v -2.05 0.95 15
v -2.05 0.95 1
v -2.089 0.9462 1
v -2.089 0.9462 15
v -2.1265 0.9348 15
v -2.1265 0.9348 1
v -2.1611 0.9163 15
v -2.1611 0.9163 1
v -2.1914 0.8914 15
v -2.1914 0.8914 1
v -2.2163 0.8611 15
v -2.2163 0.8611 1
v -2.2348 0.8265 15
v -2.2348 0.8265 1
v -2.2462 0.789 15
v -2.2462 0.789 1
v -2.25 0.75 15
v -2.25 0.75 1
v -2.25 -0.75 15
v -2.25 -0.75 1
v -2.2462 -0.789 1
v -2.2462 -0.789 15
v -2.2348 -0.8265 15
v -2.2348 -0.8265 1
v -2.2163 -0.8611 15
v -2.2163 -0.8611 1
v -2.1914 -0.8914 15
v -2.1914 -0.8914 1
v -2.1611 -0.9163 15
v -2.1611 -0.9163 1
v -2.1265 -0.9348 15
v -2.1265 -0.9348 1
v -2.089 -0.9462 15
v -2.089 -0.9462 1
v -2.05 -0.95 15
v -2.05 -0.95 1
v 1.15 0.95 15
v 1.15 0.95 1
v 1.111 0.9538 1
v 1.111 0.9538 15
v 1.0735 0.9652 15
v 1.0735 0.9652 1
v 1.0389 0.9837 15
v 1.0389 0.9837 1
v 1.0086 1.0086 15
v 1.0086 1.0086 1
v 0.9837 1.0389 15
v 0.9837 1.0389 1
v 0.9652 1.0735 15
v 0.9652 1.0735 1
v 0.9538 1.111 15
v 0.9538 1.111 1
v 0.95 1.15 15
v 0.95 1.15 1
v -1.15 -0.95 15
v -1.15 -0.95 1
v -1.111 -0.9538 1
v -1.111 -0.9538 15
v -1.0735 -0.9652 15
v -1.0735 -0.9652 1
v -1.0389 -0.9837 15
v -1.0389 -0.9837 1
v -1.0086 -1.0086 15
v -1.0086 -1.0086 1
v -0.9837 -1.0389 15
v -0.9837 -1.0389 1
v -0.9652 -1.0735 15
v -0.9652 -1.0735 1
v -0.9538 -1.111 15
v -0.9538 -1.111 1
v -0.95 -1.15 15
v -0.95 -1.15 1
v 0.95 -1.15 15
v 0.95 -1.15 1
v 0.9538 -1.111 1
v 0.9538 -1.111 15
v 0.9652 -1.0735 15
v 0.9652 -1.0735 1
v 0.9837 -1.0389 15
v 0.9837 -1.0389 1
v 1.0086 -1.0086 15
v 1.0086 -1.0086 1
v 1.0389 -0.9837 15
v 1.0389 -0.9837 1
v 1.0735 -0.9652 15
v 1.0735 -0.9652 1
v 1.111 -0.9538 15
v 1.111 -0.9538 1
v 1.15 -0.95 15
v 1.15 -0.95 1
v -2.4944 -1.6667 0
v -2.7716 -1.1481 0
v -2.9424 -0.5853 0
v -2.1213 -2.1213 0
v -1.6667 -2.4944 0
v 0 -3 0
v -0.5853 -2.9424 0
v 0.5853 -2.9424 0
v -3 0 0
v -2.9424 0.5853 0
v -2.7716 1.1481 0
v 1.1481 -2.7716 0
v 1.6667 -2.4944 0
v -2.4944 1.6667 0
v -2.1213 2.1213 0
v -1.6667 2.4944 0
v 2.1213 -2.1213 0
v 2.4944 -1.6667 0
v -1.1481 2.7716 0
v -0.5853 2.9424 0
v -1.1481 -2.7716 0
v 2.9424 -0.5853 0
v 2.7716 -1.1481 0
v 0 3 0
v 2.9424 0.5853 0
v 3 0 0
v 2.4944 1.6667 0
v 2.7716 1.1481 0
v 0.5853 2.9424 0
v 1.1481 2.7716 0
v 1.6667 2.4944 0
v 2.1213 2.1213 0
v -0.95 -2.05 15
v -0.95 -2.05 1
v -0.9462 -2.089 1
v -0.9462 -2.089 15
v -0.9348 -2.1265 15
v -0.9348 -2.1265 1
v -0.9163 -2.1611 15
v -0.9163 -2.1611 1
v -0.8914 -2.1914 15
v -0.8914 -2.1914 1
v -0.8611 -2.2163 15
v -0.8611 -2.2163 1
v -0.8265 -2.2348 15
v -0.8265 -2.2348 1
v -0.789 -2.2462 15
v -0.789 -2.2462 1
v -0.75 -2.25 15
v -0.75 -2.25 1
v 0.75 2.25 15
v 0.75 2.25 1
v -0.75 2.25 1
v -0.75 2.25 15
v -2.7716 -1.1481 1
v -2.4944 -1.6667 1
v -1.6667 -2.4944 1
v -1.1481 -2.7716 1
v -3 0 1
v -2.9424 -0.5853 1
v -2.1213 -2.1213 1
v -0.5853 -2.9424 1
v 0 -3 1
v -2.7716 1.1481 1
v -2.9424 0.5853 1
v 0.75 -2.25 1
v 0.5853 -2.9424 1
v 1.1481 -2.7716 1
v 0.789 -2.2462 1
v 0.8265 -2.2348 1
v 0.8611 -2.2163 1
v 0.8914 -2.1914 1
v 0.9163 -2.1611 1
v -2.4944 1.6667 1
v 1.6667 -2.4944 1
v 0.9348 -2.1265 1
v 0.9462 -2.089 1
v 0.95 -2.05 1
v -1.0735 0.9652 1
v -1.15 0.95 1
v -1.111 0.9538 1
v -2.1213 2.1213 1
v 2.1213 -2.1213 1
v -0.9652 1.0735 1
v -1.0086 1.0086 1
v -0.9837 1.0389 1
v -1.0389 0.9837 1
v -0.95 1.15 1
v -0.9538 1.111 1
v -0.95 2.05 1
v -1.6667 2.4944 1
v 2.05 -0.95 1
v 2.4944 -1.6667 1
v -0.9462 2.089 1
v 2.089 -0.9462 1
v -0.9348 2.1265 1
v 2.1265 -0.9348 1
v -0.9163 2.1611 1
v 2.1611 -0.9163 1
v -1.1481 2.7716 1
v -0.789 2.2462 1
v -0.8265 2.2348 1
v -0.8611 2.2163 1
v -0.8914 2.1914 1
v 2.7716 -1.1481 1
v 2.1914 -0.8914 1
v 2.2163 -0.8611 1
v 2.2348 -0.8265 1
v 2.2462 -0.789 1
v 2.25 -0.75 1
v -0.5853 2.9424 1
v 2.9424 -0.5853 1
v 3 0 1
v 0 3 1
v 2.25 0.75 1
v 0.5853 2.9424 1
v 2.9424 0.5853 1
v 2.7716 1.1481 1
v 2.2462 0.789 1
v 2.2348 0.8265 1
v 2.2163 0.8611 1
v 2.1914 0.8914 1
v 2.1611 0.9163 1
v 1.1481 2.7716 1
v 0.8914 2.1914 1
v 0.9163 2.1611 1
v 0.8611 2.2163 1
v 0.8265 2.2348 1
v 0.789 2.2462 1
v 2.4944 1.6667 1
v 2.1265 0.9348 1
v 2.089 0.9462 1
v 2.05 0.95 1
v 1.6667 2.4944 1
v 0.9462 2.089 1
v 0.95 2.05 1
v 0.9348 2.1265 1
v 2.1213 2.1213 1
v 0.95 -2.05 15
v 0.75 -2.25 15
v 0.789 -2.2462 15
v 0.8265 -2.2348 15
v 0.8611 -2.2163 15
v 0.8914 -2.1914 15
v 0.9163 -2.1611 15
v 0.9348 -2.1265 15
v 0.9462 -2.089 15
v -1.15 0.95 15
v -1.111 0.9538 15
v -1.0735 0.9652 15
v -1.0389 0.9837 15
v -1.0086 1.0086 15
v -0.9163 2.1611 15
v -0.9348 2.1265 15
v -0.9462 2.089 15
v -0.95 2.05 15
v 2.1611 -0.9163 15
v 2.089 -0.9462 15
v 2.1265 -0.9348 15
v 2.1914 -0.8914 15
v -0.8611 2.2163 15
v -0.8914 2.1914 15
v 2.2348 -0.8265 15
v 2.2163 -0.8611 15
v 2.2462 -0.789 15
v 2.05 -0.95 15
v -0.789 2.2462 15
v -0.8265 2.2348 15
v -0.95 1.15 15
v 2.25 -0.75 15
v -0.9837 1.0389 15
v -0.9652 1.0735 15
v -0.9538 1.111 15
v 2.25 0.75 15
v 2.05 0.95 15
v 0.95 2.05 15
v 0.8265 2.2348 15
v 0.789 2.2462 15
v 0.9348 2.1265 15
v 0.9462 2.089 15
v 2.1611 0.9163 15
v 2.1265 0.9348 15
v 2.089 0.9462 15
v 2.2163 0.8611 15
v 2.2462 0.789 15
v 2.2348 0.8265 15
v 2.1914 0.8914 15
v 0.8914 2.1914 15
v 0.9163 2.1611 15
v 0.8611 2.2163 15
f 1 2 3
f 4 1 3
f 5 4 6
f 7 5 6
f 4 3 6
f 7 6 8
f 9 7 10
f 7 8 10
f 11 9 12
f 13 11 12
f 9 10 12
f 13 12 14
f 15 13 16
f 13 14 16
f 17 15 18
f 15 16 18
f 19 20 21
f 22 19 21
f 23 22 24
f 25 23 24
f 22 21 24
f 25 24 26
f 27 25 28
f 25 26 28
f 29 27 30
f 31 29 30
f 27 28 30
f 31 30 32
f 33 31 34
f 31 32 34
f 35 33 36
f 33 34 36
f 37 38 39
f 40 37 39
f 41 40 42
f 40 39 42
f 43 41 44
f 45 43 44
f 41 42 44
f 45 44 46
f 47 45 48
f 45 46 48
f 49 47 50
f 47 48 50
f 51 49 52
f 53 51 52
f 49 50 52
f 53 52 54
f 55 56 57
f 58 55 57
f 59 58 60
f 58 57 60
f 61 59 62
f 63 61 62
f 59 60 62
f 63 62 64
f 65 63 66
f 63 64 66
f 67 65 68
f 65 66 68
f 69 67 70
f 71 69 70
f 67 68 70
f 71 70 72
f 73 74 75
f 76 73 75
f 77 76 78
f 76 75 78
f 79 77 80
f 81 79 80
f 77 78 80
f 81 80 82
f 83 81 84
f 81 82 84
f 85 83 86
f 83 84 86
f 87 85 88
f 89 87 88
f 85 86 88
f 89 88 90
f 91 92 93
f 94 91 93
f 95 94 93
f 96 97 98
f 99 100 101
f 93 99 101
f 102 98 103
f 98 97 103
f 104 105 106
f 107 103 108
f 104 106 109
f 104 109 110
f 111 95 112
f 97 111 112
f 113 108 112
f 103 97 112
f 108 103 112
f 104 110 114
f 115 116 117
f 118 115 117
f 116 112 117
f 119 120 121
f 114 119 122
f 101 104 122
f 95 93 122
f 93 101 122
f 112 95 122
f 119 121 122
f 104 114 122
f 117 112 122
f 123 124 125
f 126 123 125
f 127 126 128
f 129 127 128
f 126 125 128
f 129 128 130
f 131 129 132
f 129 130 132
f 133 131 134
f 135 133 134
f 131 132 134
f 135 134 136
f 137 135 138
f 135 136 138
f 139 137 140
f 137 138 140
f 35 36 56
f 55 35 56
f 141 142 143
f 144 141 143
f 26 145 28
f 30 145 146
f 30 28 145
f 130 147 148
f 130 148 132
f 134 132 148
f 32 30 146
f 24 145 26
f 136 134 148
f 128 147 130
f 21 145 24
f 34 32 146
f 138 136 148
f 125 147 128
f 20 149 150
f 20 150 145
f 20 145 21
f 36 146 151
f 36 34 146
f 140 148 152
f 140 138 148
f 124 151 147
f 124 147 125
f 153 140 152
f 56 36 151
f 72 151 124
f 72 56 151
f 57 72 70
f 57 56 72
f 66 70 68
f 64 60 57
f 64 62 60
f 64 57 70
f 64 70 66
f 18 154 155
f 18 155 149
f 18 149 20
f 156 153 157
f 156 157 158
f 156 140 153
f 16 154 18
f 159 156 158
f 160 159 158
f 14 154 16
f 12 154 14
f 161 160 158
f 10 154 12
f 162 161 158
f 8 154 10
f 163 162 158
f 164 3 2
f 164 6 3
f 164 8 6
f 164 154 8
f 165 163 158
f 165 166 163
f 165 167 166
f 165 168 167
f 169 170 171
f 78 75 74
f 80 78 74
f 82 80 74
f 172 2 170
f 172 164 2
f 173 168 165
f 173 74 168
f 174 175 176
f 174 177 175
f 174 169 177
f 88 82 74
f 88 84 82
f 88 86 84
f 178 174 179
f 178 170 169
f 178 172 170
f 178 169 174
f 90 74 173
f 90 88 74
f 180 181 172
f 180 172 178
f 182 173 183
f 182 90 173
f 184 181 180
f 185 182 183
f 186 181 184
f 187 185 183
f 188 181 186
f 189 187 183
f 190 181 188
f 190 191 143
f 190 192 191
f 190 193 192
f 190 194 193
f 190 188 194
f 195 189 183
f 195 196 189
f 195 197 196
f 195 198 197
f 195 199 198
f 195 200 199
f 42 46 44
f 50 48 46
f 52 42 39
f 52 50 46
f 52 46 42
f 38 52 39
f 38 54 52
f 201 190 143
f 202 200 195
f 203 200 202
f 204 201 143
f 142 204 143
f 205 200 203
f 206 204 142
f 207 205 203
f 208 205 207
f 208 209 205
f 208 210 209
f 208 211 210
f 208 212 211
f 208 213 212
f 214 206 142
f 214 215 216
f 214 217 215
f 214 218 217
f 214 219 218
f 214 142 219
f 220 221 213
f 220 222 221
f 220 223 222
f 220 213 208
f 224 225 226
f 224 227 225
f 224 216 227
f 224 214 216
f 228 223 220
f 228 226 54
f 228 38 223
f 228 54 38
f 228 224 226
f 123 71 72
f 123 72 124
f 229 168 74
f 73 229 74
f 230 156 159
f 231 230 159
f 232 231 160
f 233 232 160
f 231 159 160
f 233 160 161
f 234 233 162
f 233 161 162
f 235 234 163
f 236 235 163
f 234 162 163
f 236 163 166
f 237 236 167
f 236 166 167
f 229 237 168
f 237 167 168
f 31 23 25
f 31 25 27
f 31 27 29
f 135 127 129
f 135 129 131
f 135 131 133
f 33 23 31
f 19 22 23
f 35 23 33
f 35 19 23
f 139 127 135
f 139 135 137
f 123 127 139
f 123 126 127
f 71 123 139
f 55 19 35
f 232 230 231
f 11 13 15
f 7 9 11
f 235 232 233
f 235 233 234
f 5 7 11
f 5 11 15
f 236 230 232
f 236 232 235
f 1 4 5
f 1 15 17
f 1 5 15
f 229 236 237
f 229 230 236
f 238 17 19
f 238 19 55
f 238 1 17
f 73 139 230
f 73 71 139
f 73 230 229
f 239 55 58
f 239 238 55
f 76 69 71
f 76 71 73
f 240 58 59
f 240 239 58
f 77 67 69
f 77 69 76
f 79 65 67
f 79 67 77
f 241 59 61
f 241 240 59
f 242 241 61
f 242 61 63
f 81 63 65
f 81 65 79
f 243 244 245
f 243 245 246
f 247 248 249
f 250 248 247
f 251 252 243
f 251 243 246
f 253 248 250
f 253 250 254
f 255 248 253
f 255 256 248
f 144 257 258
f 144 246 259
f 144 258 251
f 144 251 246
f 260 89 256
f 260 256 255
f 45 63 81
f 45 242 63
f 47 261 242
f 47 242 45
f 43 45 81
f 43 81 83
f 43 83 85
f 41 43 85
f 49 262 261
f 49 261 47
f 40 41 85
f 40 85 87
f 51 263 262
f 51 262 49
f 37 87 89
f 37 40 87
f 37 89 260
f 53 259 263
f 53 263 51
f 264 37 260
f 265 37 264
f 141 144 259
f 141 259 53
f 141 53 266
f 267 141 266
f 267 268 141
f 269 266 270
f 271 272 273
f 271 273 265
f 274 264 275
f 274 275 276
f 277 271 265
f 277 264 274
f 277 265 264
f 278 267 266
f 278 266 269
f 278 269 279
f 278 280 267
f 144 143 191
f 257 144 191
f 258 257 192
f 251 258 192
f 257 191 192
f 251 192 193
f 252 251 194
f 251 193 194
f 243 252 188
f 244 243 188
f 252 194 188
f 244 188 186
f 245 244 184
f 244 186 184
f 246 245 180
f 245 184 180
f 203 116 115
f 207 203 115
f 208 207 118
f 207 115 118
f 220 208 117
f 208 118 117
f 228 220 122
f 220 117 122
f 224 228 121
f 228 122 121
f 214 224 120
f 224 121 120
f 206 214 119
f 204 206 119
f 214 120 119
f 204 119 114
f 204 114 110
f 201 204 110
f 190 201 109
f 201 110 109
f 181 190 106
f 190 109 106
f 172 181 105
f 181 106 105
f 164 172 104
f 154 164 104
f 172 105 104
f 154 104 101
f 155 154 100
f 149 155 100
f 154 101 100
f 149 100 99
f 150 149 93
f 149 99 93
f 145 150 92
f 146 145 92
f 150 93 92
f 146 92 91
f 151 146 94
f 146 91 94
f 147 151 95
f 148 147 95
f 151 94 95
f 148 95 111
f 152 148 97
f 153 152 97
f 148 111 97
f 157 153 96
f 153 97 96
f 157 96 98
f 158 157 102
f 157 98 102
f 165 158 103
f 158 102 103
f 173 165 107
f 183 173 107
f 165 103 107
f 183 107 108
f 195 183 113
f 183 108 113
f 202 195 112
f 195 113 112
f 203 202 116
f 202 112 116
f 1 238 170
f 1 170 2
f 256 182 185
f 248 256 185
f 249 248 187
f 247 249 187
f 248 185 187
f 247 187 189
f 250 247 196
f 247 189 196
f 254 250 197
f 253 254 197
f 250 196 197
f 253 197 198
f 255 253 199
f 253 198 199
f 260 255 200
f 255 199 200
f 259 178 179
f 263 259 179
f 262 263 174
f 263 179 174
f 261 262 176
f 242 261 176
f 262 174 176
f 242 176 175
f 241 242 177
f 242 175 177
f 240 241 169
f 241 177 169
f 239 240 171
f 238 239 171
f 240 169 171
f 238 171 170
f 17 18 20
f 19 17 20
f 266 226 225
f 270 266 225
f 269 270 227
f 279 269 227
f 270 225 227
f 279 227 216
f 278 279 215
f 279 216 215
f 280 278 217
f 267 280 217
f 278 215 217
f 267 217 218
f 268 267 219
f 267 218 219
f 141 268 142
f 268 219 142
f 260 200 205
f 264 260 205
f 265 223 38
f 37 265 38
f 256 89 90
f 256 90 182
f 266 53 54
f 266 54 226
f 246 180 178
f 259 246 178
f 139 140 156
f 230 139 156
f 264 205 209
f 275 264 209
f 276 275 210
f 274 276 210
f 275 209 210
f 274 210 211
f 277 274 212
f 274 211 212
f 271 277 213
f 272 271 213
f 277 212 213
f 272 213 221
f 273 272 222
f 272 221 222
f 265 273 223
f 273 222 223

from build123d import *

# Parameters (mm, degrees)
SKETCH1_R           = 3
BOSS_EXTRUDE1_DEPTH = 1
BOSS_EXTRUDE2_DEPTH = 14


with BuildPart() as part:
    # Sketch1 → Boss-Extrude1 (new body)
    with BuildSketch(Plane(origin=(0, 0, 0), x_dir=(0, 1, 0), z_dir=(0, 0, 1))):
        with Locations(Location((0, 0, 0), (0, 0, 270))):
            Circle(SKETCH1_R)
    extrude(amount=BOSS_EXTRUDE1_DEPTH)

    # Sketch2 → Boss-Extrude2 (add)
    with BuildSketch(Plane.XY.offset(1)):
        with BuildLine():
            Line((-0.95, 2.05), (-0.95, 1.15))
            ThreePointArc((-0.95, 1.15), (-1.008578644, 1.008578644), (-1.15, 0.95))
            Line((-1.15, 0.95), (-2.05, 0.95))
            ThreePointArc((-2.05, 0.95), (-2.191421356, 0.891421356), (-2.25, 0.75))
            Line((-2.25, 0.75), (-2.25, -0.75))
            ThreePointArc((-2.25, -0.75), (-2.191421356, -0.891421356), (-2.05, -0.95))
            Line((-2.05, -0.95), (-1.15, -0.95))
            ThreePointArc((-1.15, -0.95), (-1.008578644, -1.008578644), (-0.95, -1.15))
            Line((-0.95, -1.15), (-0.95, -2.05))
            ThreePointArc((-0.95, -2.05), (-0.891421356, -2.191421356), (-0.75, -2.25))
            Line((-0.75, -2.25), (0.75, -2.25))
            ThreePointArc((0.75, -2.25), (0.891421356, -2.191421356), (0.95, -2.05))
            Line((0.95, -2.05), (0.95, -1.15))
            ThreePointArc((0.95, -1.15), (1.008578644, -1.008578644), (1.15, -0.95))
            Line((1.15, -0.95), (2.05, -0.95))
            ThreePointArc((2.05, -0.95), (2.191421356, -0.891421356), (2.25, -0.75))
            Line((2.25, -0.75), (2.25, 0.75))
            ThreePointArc((2.25, 0.75), (2.191421356, 0.891421356), (2.05, 0.95))
            Line((2.05, 0.95), (1.15, 0.95))
            ThreePointArc((1.15, 0.95), (1.008578644, 1.008578644), (0.95, 1.15))
            Line((0.95, 1.15), (0.95, 2.05))
            ThreePointArc((0.95, 2.05), (0.891421356, 2.191421356), (0.75, 2.25))
            Line((0.75, 2.25), (-0.75, 2.25))
            ThreePointArc((-0.75, 2.25), (-0.891421356, 2.191421356), (-0.95, 2.05))
        make_face()
    extrude(amount=BOSS_EXTRUDE2_DEPTH)


solid = part.part
